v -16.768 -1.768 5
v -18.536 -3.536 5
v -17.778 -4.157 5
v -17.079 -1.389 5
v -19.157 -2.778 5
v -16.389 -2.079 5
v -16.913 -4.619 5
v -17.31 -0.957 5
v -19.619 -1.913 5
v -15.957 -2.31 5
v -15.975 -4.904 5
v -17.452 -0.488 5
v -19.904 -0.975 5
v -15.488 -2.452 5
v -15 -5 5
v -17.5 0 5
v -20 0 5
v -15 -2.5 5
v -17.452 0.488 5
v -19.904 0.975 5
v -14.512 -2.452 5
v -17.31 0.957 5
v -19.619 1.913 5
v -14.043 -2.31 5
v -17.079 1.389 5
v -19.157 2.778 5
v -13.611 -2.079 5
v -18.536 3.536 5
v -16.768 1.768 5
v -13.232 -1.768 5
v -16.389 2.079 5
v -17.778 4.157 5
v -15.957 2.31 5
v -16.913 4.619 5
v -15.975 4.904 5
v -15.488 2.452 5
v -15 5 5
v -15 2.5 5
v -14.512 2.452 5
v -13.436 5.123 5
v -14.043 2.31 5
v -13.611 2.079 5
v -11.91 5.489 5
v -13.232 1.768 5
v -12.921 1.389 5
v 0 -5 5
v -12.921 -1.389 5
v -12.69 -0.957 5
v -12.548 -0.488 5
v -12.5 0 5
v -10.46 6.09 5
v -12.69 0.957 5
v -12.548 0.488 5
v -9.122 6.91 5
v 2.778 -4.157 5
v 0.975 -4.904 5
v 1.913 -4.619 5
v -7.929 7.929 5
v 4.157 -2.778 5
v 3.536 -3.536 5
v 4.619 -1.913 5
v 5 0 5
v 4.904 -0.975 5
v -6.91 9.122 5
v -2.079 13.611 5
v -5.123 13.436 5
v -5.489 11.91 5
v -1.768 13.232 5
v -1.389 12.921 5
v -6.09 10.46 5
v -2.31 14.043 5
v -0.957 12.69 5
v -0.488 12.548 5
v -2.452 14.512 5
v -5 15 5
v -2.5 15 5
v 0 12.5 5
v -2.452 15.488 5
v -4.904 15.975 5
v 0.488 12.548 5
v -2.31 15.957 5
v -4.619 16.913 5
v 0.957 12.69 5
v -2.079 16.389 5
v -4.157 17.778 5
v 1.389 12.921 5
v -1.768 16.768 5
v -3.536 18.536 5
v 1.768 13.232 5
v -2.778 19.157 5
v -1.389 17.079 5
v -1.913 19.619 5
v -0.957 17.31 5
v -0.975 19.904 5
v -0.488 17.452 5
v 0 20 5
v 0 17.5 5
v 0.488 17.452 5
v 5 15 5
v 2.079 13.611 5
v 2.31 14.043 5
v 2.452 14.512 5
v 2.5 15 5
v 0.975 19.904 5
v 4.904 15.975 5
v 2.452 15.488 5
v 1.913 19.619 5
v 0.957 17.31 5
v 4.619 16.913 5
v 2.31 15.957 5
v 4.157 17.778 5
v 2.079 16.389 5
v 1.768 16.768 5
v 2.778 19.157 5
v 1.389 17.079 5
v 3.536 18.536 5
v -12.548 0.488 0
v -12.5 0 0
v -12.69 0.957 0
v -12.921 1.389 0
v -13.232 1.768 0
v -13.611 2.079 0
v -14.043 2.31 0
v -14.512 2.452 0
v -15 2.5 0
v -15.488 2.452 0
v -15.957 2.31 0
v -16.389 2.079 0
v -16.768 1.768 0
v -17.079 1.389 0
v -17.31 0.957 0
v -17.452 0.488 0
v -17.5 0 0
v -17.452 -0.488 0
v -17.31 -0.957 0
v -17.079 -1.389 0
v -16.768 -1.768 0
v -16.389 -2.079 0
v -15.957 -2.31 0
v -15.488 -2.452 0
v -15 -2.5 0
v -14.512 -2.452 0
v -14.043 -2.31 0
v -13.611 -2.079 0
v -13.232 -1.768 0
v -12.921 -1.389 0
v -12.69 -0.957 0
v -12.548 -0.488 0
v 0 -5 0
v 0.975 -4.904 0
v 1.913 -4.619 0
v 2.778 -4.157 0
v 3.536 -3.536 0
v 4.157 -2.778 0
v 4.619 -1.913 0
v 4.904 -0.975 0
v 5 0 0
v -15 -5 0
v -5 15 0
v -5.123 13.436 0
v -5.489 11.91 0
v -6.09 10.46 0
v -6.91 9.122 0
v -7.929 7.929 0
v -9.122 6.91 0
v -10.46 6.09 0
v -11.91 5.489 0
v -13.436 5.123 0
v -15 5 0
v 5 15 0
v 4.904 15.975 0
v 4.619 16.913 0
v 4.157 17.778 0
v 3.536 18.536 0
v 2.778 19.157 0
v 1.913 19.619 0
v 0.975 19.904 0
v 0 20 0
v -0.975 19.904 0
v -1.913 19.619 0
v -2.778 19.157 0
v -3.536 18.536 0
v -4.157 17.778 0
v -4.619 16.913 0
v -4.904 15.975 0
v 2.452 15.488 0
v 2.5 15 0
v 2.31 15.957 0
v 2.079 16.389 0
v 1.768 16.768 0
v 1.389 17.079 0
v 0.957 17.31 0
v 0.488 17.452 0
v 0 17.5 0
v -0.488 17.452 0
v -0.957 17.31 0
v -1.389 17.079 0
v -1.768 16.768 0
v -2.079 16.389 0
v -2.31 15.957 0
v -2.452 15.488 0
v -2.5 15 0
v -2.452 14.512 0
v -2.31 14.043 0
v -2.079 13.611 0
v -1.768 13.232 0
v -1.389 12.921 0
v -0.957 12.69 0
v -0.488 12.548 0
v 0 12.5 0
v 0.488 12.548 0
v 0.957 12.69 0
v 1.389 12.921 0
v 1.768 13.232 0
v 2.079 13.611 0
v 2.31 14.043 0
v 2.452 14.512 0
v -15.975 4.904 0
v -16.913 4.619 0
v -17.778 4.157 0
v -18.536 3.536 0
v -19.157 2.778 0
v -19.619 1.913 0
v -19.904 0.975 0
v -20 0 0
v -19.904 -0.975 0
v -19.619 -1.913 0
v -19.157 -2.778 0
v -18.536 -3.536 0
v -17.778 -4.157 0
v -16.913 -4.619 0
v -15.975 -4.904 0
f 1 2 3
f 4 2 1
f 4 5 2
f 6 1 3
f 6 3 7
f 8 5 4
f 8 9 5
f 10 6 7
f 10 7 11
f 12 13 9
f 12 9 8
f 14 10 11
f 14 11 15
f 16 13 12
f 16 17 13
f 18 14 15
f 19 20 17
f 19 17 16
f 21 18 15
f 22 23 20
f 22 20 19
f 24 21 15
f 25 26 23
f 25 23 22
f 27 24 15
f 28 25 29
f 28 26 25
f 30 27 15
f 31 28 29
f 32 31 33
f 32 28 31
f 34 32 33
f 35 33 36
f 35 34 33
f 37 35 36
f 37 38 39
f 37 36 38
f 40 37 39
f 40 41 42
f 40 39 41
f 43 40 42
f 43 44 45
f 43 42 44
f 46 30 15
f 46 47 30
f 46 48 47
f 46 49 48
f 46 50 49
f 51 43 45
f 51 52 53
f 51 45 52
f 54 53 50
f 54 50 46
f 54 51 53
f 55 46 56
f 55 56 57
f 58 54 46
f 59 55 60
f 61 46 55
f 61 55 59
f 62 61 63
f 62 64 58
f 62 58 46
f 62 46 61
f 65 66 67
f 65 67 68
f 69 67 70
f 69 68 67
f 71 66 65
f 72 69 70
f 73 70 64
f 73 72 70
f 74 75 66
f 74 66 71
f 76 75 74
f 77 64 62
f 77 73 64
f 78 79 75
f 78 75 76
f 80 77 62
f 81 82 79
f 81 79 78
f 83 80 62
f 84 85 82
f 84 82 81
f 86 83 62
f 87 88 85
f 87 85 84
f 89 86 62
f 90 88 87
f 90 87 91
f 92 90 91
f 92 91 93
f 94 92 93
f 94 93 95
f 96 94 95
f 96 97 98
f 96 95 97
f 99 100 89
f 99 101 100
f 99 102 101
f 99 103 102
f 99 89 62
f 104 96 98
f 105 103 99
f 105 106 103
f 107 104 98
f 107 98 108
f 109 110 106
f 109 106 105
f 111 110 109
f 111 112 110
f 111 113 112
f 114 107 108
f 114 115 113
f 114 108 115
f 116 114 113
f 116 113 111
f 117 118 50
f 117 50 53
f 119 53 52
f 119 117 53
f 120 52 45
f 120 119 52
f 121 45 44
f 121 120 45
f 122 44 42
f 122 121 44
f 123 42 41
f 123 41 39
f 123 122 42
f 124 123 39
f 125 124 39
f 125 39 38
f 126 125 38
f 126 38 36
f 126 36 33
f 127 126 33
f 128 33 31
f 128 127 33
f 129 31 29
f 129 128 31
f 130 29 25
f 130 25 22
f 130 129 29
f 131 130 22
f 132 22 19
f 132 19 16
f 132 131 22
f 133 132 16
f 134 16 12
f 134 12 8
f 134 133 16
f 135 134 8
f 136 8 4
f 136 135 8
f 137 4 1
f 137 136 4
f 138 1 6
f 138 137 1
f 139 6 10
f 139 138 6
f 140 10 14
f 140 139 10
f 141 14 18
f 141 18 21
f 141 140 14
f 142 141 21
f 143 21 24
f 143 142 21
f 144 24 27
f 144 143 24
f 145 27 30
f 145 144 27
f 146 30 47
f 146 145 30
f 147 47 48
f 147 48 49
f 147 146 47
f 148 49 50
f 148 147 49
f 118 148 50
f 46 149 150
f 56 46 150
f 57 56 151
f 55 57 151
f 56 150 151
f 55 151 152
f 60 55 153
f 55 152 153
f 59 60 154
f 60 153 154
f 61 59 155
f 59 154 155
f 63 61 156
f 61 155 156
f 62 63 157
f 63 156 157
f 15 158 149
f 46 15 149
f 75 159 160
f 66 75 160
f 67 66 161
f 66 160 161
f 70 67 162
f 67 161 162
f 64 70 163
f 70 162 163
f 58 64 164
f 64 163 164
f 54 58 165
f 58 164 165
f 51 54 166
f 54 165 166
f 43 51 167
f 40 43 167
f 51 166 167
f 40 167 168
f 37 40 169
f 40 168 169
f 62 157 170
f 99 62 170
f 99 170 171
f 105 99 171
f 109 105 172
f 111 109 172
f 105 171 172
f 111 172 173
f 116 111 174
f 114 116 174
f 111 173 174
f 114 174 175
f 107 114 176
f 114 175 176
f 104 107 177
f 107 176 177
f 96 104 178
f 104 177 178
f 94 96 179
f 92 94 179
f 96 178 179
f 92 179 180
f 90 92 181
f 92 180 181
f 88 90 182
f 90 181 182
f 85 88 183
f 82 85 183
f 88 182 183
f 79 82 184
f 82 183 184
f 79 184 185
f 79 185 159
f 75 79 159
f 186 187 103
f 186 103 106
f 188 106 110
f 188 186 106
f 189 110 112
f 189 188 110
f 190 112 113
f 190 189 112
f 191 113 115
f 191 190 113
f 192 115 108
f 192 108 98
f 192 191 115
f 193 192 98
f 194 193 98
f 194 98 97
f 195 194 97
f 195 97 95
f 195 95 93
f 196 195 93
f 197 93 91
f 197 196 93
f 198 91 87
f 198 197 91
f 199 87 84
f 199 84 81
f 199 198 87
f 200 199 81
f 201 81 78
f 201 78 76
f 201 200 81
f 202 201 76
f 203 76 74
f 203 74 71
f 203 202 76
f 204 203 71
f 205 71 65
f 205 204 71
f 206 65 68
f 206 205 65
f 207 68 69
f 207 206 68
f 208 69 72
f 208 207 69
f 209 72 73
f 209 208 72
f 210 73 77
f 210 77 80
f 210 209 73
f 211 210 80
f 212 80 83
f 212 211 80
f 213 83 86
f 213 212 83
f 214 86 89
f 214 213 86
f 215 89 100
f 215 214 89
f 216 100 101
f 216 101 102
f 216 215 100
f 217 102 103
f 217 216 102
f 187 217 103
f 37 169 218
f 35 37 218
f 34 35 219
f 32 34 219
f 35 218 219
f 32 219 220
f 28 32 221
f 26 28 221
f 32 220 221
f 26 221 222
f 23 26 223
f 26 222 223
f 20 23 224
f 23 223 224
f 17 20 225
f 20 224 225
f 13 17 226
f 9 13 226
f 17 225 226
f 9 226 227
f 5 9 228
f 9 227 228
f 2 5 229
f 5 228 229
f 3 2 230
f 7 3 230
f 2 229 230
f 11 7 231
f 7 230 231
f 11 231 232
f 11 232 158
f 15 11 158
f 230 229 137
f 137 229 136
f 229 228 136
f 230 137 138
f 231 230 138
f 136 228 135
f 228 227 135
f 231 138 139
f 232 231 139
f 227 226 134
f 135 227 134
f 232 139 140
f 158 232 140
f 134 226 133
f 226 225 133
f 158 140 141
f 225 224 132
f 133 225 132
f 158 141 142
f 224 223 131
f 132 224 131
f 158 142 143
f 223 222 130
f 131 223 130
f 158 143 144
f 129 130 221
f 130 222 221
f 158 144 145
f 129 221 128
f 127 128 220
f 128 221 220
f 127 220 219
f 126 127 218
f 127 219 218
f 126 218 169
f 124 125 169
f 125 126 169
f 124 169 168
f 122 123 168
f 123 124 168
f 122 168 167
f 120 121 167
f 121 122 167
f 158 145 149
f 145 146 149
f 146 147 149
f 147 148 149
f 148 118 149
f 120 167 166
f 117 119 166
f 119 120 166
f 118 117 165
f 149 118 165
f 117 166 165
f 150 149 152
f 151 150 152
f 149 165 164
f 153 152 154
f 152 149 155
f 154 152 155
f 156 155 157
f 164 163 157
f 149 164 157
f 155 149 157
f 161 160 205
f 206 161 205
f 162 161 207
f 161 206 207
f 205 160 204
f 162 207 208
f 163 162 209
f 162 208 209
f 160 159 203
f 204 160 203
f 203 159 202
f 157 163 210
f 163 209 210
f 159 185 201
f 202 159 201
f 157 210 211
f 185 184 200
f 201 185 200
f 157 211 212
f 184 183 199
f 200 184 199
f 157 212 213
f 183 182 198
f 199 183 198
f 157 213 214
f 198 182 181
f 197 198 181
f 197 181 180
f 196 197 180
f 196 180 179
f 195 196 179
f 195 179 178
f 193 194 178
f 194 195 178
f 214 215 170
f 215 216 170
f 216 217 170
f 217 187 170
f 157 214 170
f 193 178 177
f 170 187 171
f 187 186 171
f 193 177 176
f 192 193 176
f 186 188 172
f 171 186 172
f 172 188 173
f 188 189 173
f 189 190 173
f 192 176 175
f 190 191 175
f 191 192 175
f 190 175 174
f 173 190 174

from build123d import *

# Parameters (mm, degrees)
F0_R     = 2.5
F1_DEPTH = 5


with BuildPart() as f1:
    # F0 (on Top) → F1 (new body)
    with BuildSketch(Plane.XY):
        with BuildLine():
            ThreePointArc((0, -5), (3.535534, -3.535534), (5, 0))
            Line((5, 0), (5, 15))
            ThreePointArc((5, 15), (0, 20), (-5, 15))
            ThreePointArc((-5, 15), (-7.928932, 7.928932), (-15, 5))
            ThreePointArc((-15, 5), (-20, 0), (-15, -5))
            Line((-15, -5), (0, -5))
        make_face()
        with Locations((-15, 0)):
            Circle(F0_R, mode=Mode.SUBTRACT)
        with Locations((0, 15)):
            Circle(F0_R, mode=Mode.SUBTRACT)
    extrude(amount=F1_DEPTH)


solid = f1.part
